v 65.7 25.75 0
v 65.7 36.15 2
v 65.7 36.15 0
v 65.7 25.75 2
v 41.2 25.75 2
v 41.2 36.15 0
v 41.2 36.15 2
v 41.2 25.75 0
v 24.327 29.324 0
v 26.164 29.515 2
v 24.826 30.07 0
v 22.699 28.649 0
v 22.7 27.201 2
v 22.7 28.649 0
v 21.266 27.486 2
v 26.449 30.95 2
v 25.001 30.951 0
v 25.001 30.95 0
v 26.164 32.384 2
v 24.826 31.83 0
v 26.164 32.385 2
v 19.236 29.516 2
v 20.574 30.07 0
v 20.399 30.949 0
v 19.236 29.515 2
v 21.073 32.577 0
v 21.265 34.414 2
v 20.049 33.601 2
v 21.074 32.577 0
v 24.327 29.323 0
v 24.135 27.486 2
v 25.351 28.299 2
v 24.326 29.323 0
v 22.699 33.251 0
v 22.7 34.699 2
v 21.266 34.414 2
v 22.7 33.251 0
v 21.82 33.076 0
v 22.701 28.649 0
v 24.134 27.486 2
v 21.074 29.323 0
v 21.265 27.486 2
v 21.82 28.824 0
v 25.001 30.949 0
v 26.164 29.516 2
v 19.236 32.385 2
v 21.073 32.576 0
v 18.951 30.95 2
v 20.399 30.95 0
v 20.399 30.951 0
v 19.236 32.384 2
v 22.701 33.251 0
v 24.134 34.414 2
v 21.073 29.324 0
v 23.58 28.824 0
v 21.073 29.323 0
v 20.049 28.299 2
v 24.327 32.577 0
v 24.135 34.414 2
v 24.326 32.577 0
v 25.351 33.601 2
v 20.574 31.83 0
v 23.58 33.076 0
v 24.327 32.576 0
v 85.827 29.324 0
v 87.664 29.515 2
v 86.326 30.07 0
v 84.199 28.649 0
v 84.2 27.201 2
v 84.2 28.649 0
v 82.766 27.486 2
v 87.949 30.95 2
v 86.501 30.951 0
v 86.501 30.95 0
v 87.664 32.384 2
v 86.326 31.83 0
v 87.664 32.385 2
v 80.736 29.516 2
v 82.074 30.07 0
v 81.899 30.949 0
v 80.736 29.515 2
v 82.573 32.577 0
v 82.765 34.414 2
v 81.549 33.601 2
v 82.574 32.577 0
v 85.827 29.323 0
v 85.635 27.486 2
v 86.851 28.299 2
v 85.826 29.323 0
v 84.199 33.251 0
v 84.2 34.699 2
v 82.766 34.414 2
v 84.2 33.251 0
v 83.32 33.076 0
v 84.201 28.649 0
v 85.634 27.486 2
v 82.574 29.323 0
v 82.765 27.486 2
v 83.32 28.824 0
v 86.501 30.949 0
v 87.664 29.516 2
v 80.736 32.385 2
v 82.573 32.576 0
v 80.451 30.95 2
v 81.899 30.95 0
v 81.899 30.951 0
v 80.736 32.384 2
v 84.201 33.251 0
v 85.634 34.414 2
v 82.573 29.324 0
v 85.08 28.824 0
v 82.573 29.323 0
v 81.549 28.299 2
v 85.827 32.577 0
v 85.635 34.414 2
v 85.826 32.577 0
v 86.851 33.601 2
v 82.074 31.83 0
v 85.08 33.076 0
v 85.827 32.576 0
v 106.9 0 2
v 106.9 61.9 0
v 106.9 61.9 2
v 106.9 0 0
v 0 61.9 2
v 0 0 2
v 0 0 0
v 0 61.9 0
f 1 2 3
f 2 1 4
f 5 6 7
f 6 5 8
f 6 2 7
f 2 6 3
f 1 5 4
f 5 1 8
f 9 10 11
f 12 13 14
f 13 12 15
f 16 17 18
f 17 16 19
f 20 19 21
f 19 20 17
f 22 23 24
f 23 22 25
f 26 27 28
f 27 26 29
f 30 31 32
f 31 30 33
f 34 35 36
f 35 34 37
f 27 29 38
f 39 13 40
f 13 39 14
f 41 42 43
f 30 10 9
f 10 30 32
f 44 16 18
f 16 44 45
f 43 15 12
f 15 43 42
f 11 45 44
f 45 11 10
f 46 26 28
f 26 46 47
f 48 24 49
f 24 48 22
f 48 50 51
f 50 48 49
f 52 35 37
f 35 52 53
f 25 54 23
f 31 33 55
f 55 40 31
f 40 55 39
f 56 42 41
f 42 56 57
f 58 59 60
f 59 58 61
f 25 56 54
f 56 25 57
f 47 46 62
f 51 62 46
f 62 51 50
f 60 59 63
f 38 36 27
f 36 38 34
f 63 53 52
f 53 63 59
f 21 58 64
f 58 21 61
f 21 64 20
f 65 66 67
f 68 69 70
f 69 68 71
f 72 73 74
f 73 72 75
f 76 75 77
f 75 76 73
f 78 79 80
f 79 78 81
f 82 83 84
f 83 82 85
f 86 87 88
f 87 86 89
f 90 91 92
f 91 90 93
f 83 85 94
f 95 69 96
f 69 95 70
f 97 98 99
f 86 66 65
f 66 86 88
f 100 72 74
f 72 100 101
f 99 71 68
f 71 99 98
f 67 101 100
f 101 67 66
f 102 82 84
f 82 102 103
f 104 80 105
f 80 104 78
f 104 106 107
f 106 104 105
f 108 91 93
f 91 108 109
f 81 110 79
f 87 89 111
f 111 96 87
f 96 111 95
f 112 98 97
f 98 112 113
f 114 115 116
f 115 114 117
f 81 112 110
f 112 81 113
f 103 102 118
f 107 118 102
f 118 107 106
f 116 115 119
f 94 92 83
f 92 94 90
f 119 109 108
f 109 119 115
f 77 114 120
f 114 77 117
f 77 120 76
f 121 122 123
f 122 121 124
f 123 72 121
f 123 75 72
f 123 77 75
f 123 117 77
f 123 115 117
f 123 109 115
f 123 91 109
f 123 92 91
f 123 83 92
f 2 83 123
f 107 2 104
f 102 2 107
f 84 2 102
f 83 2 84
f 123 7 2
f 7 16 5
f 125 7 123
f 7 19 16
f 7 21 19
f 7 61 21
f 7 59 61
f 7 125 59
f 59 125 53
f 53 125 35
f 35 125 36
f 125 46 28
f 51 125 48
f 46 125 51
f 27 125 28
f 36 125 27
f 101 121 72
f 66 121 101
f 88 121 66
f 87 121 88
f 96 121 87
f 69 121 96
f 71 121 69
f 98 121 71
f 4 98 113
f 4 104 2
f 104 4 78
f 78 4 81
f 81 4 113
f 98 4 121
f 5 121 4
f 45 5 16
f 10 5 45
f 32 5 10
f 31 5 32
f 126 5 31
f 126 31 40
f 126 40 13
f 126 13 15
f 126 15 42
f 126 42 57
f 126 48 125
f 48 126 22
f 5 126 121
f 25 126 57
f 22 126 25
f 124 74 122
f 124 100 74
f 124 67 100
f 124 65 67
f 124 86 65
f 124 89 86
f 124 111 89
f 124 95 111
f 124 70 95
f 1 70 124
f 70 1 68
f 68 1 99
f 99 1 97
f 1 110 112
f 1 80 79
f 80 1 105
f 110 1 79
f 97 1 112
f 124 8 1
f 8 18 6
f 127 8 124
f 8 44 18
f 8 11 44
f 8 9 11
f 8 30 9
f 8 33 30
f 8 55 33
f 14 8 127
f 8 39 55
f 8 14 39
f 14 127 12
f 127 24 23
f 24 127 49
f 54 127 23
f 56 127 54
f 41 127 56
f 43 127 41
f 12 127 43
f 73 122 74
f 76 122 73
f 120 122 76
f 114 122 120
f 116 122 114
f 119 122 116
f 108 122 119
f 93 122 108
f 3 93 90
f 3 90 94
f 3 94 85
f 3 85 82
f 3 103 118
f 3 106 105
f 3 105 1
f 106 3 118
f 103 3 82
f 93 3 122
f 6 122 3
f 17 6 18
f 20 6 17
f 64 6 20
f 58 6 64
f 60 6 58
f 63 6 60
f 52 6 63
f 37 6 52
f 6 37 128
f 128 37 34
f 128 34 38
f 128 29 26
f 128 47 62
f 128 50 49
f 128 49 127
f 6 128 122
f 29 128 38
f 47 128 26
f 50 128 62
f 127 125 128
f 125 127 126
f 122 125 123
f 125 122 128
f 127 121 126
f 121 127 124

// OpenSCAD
union() {
	difference() {
		cube(size = [106.9000000000, 61.9000000000, 2]);
		union() {
			union() {
				translate(v = [41.2000000000, 25.7500000000, -1]) {
					cube(size = [24.5000000000, 10.4000000000, 10]);
				}
				translate(v = [22.7000000000, 30.9500000000, -0.0010000000]) {
					cylinder($fn = 16, h = 2.0020000000, r1 = 2.3000000000, r2 = 3.7500000000);
				}
			}
			translate(v = [84.2000000000, 30.9500000000, -0.0010000000]) {
				cylinder($fn = 16, h = 2.0020000000, r1 = 2.3000000000, r2 = 3.7500000000);
			}
		}
	}
}
